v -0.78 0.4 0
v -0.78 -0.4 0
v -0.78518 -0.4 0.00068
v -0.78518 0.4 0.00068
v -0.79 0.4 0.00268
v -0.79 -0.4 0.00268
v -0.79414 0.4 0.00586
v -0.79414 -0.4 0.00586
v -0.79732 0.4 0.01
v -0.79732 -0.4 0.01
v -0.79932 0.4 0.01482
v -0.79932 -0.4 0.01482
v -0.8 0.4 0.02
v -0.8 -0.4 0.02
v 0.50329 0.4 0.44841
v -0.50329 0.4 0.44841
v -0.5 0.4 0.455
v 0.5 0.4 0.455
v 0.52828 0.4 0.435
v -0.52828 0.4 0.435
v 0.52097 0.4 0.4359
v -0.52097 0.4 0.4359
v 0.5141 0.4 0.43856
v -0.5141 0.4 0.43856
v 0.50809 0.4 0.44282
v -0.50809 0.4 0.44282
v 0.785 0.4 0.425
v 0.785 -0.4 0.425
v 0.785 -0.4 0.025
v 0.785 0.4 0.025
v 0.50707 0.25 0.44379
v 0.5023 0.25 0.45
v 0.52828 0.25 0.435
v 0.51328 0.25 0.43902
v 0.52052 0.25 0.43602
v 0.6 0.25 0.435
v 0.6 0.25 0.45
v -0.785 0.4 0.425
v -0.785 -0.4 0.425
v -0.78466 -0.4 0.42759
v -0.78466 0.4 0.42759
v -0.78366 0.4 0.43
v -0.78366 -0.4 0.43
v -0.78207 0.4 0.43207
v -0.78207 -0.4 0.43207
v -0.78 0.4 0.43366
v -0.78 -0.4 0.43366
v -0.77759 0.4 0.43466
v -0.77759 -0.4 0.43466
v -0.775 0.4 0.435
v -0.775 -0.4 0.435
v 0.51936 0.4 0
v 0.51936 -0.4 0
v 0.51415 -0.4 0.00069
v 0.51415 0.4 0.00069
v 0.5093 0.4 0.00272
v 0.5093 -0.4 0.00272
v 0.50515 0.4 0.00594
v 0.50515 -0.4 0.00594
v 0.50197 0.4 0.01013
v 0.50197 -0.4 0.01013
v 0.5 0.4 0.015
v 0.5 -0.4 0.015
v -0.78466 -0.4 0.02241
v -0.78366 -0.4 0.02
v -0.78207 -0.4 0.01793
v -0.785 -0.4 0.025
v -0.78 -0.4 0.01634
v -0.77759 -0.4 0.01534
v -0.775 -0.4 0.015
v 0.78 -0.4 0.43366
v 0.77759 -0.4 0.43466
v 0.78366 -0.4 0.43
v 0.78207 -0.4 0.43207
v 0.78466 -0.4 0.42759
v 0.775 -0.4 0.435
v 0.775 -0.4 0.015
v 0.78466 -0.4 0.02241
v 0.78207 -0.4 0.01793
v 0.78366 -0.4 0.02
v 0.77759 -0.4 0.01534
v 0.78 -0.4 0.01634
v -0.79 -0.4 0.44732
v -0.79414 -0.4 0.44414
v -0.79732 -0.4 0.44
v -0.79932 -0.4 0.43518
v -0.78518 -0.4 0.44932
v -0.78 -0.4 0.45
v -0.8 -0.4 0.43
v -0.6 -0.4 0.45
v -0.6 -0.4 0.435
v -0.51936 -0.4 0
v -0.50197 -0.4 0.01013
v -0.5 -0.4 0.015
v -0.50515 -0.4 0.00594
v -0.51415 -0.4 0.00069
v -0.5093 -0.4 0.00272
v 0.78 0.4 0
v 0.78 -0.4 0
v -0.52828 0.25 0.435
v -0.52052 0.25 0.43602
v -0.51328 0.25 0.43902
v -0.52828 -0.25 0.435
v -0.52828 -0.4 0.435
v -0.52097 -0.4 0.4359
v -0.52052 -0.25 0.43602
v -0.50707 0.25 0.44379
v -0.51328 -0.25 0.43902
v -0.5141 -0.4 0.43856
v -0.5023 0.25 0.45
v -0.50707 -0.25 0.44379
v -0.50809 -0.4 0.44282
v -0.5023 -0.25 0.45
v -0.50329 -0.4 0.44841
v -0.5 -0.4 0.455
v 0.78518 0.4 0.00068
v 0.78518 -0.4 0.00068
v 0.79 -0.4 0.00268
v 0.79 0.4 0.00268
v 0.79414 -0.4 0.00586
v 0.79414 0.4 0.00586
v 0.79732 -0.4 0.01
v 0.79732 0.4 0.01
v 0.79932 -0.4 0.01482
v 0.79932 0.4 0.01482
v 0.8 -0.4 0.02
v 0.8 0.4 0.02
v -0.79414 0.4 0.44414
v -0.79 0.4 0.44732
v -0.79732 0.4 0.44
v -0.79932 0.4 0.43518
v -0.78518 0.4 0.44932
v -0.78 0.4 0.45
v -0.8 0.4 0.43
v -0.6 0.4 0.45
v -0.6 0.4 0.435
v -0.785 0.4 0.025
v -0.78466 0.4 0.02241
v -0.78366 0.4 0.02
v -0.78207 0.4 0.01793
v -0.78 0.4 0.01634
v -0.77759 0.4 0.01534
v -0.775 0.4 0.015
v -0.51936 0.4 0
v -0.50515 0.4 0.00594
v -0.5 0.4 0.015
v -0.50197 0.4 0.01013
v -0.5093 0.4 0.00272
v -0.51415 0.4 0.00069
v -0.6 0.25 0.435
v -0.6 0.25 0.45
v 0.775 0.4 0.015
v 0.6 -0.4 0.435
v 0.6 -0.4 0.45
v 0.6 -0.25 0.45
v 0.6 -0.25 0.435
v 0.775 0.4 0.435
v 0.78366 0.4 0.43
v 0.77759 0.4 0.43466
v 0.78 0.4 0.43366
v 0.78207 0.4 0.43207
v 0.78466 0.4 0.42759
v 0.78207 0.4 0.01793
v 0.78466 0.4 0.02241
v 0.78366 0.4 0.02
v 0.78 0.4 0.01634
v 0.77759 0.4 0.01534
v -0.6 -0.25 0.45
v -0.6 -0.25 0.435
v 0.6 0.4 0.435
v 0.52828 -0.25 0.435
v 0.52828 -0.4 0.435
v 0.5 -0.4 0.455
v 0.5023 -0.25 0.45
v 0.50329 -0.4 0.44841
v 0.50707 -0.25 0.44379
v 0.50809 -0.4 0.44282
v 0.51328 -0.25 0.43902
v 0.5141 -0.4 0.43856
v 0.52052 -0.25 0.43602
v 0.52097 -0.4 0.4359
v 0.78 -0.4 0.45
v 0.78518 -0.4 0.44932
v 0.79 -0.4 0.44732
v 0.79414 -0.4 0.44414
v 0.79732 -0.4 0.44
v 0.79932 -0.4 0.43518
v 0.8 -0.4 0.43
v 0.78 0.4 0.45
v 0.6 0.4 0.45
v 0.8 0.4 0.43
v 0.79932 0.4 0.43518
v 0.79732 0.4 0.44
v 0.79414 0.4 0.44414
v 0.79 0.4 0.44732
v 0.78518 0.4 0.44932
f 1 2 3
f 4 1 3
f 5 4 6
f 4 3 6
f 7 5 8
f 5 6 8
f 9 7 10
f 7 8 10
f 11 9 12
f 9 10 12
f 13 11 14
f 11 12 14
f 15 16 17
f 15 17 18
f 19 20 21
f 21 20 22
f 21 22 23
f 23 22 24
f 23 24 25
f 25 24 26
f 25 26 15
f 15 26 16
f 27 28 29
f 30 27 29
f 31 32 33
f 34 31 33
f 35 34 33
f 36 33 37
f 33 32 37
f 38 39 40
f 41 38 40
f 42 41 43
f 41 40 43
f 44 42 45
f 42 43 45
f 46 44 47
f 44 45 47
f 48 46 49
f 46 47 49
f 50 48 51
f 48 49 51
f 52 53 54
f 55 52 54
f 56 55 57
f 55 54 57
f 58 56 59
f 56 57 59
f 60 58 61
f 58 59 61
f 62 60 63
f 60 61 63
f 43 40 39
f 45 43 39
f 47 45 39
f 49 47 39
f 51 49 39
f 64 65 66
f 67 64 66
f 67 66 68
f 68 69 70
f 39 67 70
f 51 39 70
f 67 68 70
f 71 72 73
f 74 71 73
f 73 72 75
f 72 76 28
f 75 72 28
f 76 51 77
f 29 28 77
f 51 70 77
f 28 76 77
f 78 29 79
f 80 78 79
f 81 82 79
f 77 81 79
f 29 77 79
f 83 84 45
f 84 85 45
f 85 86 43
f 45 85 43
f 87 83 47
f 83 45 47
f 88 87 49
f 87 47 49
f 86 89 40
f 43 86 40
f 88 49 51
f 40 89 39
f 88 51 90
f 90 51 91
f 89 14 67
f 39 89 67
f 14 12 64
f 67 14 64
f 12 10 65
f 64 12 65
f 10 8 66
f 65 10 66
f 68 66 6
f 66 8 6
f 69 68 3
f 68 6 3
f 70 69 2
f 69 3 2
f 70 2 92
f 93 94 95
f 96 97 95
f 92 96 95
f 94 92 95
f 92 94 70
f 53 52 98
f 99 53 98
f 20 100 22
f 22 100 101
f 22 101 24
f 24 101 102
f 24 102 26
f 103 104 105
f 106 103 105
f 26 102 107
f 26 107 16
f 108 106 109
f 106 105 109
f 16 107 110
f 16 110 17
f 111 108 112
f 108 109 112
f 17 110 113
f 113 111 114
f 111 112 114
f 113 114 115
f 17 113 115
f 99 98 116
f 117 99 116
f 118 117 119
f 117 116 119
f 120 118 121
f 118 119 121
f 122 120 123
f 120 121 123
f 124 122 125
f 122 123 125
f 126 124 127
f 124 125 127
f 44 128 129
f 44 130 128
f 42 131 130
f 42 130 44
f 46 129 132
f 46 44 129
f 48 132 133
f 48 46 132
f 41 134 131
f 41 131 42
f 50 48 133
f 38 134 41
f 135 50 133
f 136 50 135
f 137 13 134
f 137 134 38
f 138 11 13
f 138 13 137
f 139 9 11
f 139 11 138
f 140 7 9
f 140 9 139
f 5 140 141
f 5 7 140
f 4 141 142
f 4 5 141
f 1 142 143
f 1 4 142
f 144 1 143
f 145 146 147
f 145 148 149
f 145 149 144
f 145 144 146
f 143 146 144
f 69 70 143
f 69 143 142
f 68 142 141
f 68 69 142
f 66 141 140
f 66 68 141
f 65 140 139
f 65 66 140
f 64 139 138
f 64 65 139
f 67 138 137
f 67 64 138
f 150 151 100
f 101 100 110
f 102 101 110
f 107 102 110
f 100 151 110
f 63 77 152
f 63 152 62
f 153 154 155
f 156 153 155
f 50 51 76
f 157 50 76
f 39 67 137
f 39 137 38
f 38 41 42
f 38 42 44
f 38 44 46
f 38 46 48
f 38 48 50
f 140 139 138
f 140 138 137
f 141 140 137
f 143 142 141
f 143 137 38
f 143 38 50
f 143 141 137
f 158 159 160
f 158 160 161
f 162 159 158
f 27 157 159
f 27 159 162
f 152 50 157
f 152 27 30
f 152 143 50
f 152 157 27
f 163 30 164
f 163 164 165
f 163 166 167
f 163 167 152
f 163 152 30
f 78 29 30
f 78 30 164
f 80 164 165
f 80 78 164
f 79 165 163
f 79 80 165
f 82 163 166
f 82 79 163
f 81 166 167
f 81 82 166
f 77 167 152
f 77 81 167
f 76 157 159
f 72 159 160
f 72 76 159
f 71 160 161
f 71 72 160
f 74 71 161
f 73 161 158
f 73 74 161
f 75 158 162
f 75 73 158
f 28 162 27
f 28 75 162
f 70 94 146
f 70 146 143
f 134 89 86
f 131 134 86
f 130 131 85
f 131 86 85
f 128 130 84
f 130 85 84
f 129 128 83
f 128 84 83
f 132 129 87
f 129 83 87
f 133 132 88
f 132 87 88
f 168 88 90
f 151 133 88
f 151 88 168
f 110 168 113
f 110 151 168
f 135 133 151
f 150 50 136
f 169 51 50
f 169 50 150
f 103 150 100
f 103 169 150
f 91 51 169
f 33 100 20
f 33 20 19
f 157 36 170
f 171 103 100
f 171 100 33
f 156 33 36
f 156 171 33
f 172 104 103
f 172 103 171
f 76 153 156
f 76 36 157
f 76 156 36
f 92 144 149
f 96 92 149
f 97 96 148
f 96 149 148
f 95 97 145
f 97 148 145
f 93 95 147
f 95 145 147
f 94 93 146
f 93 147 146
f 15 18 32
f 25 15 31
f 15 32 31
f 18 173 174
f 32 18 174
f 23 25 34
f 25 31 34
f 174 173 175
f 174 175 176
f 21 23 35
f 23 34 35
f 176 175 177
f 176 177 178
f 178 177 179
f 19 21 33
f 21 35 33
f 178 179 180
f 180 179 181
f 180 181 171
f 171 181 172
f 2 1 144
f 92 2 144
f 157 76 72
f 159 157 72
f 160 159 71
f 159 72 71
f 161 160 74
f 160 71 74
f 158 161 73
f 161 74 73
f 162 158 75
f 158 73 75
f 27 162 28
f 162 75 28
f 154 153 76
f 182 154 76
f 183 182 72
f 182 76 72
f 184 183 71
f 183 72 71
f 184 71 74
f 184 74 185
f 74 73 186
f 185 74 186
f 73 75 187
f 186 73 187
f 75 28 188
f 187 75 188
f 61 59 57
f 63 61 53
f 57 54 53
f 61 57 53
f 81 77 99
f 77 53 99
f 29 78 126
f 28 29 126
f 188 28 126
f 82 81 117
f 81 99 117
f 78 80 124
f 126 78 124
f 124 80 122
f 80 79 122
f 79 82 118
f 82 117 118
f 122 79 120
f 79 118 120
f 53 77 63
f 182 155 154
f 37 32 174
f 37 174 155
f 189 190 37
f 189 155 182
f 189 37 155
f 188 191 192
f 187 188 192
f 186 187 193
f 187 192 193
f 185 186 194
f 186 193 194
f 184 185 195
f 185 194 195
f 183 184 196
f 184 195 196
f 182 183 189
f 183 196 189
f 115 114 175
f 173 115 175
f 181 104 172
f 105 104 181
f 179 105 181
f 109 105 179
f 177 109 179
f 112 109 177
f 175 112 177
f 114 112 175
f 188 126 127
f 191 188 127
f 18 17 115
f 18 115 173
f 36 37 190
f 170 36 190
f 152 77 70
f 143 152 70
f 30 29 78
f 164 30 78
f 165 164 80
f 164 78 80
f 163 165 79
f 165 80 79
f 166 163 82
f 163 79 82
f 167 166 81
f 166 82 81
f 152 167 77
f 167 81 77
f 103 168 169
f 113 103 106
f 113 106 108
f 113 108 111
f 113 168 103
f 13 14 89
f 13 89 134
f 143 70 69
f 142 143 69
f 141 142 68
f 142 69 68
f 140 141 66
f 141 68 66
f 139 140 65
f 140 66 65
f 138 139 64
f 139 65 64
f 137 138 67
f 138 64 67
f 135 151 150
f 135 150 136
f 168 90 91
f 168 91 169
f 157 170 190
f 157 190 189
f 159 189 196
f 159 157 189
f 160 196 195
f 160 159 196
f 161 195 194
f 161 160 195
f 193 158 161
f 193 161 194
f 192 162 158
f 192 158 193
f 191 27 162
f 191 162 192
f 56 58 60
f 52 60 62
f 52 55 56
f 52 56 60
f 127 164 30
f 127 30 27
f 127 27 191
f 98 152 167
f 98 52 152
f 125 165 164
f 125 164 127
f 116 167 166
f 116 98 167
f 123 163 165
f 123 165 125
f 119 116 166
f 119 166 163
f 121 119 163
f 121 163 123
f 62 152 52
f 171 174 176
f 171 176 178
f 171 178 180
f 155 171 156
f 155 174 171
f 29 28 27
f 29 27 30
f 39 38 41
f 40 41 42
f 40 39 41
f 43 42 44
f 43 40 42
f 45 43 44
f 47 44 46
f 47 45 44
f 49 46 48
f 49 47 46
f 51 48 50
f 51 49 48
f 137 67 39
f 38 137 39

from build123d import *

# Parameters (mm, degrees)
SKETCH1_W                        = 1.6
SKETCH1_H                        = 0.8
ALL_BODY_EXTRUDE_DEPTH           = 0.45
SKETCH3_W                        = 1.2
SKETCH3_H                        = 0.15
CUT_OUT_FOR_PIN_UPPER_DEPTH      = 0.015
SKETCH2_W                        = 1
SKETCH2_H                        = 0.8
CUT_OUT_FOR_PIN_LOWER_DEPTH      = 0.015
SKETCH4_W                        = 1
SKETCH4_H                        = 0.8
COATING_EXTRUDE_DEPTH            = 0.02
COATING_START                    = -0.4
COATING_FILLET_DEPTH             = 0.8
BODY_CUT_OUT_FOR_TOTAL_PIN_DEPTH = 2.219436345
BODY_EXTRUDE_DEPTH               = 0.8
PIN_FILLET_R                     = 0.02


with BuildPart() as part:
    # Sketch1 → All body extrude (new body)
    with BuildSketch(Plane.XY):
        Rectangle(SKETCH1_W, SKETCH1_H)
    extrude(amount=ALL_BODY_EXTRUDE_DEPTH)

    # Sketch3 → Cut out for pin-upper (cut)
    with BuildSketch(Plane.XY.offset(0.45)):
        with Locations((0, 0.325)):
            Rectangle(SKETCH3_W, SKETCH3_H)
        with Locations((0, -0.325)):
            Rectangle(SKETCH3_W, SKETCH3_H)
    extrude(amount=-CUT_OUT_FOR_PIN_UPPER_DEPTH, mode=Mode.SUBTRACT)

    # Sketch2 → Cut out for pin-lower (cut)
    with BuildSketch(Plane(origin=(0, 0, 0), x_dir=(-1, 0, 0), z_dir=(0, 0, -1))):
        Rectangle(SKETCH2_W, SKETCH2_H)
    extrude(amount=-CUT_OUT_FOR_PIN_LOWER_DEPTH, mode=Mode.SUBTRACT)

    # Sketch4 → Coating extrude (add)
    with BuildSketch(Plane.XY.offset(0.435)):
        Rectangle(SKETCH4_W, SKETCH4_H)
    extrude(amount=COATING_EXTRUDE_DEPTH)

    # Coating fillet: read off the stored shape, not the designer's step
    # Coating fillet outline → Coating fillet (add)
    with BuildSketch(Plane(origin=(0, 0, 0), x_dir=(1, 0, 0), z_dir=(0, 1, 0)).offset(COATING_START)):
        with BuildLine():
            Line((-0.5, -0.435), (-0.528284271, -0.435))
            ThreePointArc((-0.528284271, -0.435), (-0.510963763, -0.440505103), (-0.5, -0.455))
            Line((-0.5, -0.455), (-0.5, -0.435))
        make_face()
        with BuildLine():
            ThreePointArc((0.5, -0.455), (0.510963763, -0.440505103), (0.528284271, -0.435))
            Line((0.528284271, -0.435), (0.5, -0.435))
            Line((0.5, -0.435), (0.5, -0.455))
        make_face()
    extrude(amount=COATING_FILLET_DEPTH)

    # Sketch6 → Body cut out for total pin (cut, through all)
    with BuildSketch(Plane.XZ.offset(0.4)):
        with BuildLine():
            Line((-0.775, 0.435), (0.775, 0.435))
            ThreePointArc((0.775, 0.435), (0.782071068, 0.432071068), (0.785, 0.425))
            Line((0.785, 0.425), (0.785, 0.025))
            ThreePointArc((0.785, 0.025), (0.782071068, 0.017928932), (0.775, 0.015))
            Line((0.775, 0.015), (-0.775, 0.015))
            ThreePointArc((-0.775, 0.015), (-0.782071068, 0.017928932), (-0.785, 0.025))
            Line((-0.785, 0.025), (-0.785, 0.425))
            ThreePointArc((-0.785, 0.425), (-0.782071068, 0.432071068), (-0.775, 0.435))
        make_face()
    extrude(amount=-BODY_CUT_OUT_FOR_TOTAL_PIN_DEPTH, mode=Mode.SUBTRACT)

    # Pin fillet
    # the kernel refuses this fillet: 0.02 mm, written as the material it takes off along each edge
    with BuildSketch(Plane(origin=(0.8, 0.45, 0.45), x_dir=(-1, 0, 0), z_dir=(0, -1, 0)), Plane(origin=(-0.8, -0.45, 0.45), x_dir=(1, 0, 0), z_dir=(0, 1, 0))) as pin_fillet_piece_1:
        with BuildLine():
            CenterArc((PIN_FILLET_R, PIN_FILLET_R), PIN_FILLET_R, 180, 90)
            Line((0, PIN_FILLET_R), (-PIN_FILLET_R * 0.02, PIN_FILLET_R))
            Line((-PIN_FILLET_R * 0.02, PIN_FILLET_R), (-PIN_FILLET_R * 0.02, -PIN_FILLET_R * 0.02))
            Line((-PIN_FILLET_R * 0.02, -PIN_FILLET_R * 0.02), (PIN_FILLET_R, -PIN_FILLET_R * 0.02))
            Line((PIN_FILLET_R, -PIN_FILLET_R * 0.02), (PIN_FILLET_R, 0))
        make_face()
    extrude(amount=0.9, mode=Mode.SUBTRACT)
    with BuildSketch(Plane(origin=(0.8, 0.45, 0), x_dir=(-1, 0, 0), z_dir=(0, -1, 0)), Plane(origin=(-0.8, -0.45, 0), x_dir=(1, 0, 0), z_dir=(0, 1, 0))) as pin_fillet_piece_2:
        with BuildLine():
            CenterArc((PIN_FILLET_R, -PIN_FILLET_R), PIN_FILLET_R, 90, 90)
            Line((0, -PIN_FILLET_R), (-PIN_FILLET_R * 0.02, -PIN_FILLET_R))
            Line((-PIN_FILLET_R * 0.02, -PIN_FILLET_R), (-PIN_FILLET_R * 0.02, PIN_FILLET_R * 0.02))
            Line((-PIN_FILLET_R * 0.02, PIN_FILLET_R * 0.02), (PIN_FILLET_R, PIN_FILLET_R * 0.02))
            Line((PIN_FILLET_R, PIN_FILLET_R * 0.02), (PIN_FILLET_R, 0))
        make_face()
    extrude(amount=0.9, mode=Mode.SUBTRACT)
    with BuildSketch(Plane(origin=(0.5, -0.448412292, 0), x_dir=(1, 0, 0), z_dir=(0, 1, 0)), Plane(origin=(-0.5, 0.448412292, 0), x_dir=(-1, 0, 0), z_dir=(0, -1, 0))) as pin_fillet_piece_3:
        with BuildLine():
            CenterArc((0.019364917, -0.02), PIN_FILLET_R, 90, 75.522487815)
            Line((0, -0.015), (-0.000387298, -0.0149))
            ThreePointArc((-0.000387298, -0.0149), (-0.0004, -0.0075), (-0.0004, 0))
            Line((-0.0004, 0), (0, 0.0004))
            Line((0, 0.0004), (0.019364917, 0.0004))
            Line((0.019364917, 0.0004), (0.019364917, 0))
        make_face()
    extrude(amount=0.896824584, mode=Mode.SUBTRACT)


with BuildPart() as body_2:
    # Sketch7 → Body extrude (new, through all)
    with BuildSketch(Plane(origin=(0, -0.4, 0), x_dir=(1, 0, 0), z_dir=(0, 1, 0))):
        with BuildLine():
            Line((-0.775, -0.435), (0.775, -0.435))
            ThreePointArc((0.775, -0.435), (0.782071068, -0.432071068), (0.785, -0.425))
            Line((0.785, -0.425), (0.785, -0.025))
            ThreePointArc((0.785, -0.025), (0.782071068, -0.017928932), (0.775, -0.015))
            Line((0.775, -0.015), (-0.775, -0.015))
            ThreePointArc((-0.775, -0.015), (-0.782071068, -0.017928932), (-0.785, -0.025))
            Line((-0.785, -0.025), (-0.785, -0.425))
            ThreePointArc((-0.785, -0.425), (-0.782071068, -0.432071068), (-0.775, -0.435))
        make_face()
    extrude(amount=BODY_EXTRUDE_DEPTH)


solid = Compound([part.part, body_2.part])
